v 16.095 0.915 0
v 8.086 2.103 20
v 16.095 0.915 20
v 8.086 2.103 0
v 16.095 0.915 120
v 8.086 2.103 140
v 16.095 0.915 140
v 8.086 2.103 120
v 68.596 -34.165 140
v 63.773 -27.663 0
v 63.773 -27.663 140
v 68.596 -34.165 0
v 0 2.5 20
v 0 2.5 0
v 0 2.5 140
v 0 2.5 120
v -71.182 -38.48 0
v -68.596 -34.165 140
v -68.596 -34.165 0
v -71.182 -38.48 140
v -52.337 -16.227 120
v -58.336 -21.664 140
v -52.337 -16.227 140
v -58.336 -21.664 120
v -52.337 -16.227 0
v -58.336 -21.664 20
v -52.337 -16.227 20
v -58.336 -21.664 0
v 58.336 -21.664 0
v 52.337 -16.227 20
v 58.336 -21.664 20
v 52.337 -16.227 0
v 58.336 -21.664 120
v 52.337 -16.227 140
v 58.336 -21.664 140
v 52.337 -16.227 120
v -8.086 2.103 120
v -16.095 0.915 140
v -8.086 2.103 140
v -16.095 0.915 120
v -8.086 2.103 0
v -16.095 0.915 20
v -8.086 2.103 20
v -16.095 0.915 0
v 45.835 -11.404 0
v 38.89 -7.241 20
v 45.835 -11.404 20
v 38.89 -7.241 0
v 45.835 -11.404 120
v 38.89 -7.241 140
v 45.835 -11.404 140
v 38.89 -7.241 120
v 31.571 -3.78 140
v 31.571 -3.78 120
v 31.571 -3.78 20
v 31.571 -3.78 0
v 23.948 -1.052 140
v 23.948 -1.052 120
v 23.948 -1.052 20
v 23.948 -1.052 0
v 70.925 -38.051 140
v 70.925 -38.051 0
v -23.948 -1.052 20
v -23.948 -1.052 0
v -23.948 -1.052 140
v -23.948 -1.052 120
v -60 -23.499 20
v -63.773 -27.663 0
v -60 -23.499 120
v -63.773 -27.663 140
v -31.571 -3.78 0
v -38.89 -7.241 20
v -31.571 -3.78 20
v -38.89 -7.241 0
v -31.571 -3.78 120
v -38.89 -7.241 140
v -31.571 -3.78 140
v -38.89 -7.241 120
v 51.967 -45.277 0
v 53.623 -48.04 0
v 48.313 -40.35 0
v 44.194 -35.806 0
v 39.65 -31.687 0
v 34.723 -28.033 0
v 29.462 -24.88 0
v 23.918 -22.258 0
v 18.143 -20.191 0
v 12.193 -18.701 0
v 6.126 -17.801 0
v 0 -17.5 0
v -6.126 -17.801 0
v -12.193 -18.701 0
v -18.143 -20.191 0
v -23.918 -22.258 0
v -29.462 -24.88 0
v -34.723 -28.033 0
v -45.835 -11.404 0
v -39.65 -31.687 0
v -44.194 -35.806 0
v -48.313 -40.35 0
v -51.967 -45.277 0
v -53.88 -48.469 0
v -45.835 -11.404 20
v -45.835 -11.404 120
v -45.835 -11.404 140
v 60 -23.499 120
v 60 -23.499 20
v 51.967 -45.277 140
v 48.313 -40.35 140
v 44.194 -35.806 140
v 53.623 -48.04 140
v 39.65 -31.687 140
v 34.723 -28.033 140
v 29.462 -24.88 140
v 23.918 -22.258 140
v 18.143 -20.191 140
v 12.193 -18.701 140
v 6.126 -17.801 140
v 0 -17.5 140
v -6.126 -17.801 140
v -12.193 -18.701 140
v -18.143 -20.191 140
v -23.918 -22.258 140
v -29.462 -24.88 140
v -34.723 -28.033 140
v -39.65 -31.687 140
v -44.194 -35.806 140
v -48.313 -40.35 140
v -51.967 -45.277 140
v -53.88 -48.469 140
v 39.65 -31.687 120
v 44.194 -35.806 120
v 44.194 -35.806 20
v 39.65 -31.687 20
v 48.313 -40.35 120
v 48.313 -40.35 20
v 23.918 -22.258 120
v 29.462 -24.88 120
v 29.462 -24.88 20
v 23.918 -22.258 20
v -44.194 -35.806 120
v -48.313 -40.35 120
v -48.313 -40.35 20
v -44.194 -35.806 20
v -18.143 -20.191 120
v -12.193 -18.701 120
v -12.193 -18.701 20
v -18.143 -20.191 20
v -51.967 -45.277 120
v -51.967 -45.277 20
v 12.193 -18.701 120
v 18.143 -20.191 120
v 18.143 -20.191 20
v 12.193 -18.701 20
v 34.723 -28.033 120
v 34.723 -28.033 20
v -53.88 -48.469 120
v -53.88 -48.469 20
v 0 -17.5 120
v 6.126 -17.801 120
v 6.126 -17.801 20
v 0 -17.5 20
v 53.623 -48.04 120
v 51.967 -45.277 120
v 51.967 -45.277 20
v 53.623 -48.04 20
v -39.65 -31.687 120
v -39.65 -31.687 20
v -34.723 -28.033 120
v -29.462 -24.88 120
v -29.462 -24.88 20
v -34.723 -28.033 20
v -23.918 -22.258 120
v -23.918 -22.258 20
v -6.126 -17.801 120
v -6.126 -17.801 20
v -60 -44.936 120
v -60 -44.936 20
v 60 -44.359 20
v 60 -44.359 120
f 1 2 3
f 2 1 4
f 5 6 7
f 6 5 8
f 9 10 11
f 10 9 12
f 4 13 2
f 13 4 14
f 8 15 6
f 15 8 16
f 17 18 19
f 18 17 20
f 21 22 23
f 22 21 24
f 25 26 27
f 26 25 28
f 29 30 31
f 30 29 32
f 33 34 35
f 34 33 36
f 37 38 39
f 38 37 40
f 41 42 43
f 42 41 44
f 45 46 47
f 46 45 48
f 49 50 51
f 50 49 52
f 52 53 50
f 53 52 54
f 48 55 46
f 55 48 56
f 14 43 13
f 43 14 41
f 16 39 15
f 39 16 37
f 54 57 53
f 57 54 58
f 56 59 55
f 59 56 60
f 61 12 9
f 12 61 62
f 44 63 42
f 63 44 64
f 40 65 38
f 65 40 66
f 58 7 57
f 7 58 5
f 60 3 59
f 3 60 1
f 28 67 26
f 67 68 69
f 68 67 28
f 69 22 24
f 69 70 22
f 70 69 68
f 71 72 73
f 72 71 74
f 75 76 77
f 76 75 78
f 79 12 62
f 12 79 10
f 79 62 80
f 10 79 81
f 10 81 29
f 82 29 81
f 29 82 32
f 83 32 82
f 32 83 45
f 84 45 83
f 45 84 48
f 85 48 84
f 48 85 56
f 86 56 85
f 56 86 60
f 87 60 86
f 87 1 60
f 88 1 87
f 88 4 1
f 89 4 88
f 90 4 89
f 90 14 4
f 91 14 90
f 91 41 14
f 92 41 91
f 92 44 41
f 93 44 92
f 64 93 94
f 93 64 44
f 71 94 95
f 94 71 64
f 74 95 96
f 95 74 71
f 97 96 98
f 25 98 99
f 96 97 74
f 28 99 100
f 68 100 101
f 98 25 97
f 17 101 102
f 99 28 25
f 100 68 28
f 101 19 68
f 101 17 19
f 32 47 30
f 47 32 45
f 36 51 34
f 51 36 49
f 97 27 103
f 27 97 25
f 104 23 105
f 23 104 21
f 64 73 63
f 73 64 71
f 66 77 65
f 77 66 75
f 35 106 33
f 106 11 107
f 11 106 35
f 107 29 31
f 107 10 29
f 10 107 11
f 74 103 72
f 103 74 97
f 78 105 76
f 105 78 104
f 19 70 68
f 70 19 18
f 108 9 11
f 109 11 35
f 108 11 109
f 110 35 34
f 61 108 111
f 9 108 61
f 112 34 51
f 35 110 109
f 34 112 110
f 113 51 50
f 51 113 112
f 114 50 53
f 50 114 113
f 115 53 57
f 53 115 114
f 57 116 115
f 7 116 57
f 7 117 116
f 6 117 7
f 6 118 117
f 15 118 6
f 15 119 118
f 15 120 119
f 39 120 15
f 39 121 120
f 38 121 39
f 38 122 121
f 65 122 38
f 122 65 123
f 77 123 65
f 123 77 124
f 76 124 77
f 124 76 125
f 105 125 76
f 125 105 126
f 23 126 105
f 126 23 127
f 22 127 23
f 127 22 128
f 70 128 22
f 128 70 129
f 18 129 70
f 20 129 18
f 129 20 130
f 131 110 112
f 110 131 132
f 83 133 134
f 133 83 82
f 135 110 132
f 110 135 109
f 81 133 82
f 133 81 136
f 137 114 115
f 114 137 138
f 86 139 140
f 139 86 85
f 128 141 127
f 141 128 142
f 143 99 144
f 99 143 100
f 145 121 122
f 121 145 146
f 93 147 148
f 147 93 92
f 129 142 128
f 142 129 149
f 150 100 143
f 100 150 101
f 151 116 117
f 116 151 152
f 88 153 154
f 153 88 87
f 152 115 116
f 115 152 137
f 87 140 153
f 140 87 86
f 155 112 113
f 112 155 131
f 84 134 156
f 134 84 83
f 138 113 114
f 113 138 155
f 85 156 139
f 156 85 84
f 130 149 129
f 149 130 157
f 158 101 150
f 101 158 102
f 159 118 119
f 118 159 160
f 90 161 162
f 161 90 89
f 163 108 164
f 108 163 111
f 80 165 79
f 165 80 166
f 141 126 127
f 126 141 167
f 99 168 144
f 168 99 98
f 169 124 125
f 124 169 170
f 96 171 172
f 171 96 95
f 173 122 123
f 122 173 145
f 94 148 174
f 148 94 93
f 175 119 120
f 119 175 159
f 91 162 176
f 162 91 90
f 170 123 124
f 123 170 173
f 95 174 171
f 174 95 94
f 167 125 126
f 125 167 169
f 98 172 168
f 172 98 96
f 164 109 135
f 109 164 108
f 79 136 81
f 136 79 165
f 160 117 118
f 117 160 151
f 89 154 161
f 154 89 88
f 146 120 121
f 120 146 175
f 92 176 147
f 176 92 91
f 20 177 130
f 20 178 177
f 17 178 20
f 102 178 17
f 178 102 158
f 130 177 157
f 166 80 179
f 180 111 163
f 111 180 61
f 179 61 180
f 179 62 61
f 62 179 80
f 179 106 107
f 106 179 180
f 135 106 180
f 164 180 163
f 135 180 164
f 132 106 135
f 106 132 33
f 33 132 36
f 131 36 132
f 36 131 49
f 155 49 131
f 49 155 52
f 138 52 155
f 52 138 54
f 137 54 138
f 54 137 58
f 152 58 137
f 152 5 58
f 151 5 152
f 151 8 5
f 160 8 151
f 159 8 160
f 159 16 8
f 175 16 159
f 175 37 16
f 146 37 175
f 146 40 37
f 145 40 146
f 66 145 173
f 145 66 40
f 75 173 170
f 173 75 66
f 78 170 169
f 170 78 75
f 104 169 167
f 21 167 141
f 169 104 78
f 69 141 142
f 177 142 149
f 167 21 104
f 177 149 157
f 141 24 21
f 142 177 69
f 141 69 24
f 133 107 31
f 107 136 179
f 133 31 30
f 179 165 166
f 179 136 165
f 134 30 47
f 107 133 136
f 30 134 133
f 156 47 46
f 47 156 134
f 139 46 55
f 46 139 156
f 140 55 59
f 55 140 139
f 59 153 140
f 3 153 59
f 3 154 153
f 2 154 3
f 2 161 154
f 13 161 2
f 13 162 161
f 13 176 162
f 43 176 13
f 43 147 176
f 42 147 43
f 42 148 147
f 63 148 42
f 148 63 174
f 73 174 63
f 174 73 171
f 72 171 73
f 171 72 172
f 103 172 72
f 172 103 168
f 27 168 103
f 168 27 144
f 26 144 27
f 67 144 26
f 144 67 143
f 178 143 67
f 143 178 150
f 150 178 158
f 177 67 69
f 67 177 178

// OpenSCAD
$fn=64;
translate(v = [0, -80])
difference(){cylinder(h = 140.000, r = 82.500);
translate(v = [0, 0, -0.010])
cylinder(h = 140.020, r = 62.500);
translate(v = [0, 1, -0.500])
linear_extrude(height = 141.000){translate(v = [-83, 0])
polygon(points = [[0, 0], [82.000, 0.000], [0, 47.343], [0, 0]]);
}
translate(v = [0, 1, -0.500])
linear_extrude(height = 141.000){translate(v = [82, 0])
mirror(v = [1, 0])
polygon(points = [[0, 0], [82.000, 0.000], [0, 47.343], [0, 0]]);
}
translate(v = [0, -155, -0.500])
translate(v = [-83.500, 0])
cube(size = [167, 165, 141.000]);
translate(v = [0, 0, 20])
translate(v = [-60.000, 0])
cube(size = [120, 100, 100.000]);
}
